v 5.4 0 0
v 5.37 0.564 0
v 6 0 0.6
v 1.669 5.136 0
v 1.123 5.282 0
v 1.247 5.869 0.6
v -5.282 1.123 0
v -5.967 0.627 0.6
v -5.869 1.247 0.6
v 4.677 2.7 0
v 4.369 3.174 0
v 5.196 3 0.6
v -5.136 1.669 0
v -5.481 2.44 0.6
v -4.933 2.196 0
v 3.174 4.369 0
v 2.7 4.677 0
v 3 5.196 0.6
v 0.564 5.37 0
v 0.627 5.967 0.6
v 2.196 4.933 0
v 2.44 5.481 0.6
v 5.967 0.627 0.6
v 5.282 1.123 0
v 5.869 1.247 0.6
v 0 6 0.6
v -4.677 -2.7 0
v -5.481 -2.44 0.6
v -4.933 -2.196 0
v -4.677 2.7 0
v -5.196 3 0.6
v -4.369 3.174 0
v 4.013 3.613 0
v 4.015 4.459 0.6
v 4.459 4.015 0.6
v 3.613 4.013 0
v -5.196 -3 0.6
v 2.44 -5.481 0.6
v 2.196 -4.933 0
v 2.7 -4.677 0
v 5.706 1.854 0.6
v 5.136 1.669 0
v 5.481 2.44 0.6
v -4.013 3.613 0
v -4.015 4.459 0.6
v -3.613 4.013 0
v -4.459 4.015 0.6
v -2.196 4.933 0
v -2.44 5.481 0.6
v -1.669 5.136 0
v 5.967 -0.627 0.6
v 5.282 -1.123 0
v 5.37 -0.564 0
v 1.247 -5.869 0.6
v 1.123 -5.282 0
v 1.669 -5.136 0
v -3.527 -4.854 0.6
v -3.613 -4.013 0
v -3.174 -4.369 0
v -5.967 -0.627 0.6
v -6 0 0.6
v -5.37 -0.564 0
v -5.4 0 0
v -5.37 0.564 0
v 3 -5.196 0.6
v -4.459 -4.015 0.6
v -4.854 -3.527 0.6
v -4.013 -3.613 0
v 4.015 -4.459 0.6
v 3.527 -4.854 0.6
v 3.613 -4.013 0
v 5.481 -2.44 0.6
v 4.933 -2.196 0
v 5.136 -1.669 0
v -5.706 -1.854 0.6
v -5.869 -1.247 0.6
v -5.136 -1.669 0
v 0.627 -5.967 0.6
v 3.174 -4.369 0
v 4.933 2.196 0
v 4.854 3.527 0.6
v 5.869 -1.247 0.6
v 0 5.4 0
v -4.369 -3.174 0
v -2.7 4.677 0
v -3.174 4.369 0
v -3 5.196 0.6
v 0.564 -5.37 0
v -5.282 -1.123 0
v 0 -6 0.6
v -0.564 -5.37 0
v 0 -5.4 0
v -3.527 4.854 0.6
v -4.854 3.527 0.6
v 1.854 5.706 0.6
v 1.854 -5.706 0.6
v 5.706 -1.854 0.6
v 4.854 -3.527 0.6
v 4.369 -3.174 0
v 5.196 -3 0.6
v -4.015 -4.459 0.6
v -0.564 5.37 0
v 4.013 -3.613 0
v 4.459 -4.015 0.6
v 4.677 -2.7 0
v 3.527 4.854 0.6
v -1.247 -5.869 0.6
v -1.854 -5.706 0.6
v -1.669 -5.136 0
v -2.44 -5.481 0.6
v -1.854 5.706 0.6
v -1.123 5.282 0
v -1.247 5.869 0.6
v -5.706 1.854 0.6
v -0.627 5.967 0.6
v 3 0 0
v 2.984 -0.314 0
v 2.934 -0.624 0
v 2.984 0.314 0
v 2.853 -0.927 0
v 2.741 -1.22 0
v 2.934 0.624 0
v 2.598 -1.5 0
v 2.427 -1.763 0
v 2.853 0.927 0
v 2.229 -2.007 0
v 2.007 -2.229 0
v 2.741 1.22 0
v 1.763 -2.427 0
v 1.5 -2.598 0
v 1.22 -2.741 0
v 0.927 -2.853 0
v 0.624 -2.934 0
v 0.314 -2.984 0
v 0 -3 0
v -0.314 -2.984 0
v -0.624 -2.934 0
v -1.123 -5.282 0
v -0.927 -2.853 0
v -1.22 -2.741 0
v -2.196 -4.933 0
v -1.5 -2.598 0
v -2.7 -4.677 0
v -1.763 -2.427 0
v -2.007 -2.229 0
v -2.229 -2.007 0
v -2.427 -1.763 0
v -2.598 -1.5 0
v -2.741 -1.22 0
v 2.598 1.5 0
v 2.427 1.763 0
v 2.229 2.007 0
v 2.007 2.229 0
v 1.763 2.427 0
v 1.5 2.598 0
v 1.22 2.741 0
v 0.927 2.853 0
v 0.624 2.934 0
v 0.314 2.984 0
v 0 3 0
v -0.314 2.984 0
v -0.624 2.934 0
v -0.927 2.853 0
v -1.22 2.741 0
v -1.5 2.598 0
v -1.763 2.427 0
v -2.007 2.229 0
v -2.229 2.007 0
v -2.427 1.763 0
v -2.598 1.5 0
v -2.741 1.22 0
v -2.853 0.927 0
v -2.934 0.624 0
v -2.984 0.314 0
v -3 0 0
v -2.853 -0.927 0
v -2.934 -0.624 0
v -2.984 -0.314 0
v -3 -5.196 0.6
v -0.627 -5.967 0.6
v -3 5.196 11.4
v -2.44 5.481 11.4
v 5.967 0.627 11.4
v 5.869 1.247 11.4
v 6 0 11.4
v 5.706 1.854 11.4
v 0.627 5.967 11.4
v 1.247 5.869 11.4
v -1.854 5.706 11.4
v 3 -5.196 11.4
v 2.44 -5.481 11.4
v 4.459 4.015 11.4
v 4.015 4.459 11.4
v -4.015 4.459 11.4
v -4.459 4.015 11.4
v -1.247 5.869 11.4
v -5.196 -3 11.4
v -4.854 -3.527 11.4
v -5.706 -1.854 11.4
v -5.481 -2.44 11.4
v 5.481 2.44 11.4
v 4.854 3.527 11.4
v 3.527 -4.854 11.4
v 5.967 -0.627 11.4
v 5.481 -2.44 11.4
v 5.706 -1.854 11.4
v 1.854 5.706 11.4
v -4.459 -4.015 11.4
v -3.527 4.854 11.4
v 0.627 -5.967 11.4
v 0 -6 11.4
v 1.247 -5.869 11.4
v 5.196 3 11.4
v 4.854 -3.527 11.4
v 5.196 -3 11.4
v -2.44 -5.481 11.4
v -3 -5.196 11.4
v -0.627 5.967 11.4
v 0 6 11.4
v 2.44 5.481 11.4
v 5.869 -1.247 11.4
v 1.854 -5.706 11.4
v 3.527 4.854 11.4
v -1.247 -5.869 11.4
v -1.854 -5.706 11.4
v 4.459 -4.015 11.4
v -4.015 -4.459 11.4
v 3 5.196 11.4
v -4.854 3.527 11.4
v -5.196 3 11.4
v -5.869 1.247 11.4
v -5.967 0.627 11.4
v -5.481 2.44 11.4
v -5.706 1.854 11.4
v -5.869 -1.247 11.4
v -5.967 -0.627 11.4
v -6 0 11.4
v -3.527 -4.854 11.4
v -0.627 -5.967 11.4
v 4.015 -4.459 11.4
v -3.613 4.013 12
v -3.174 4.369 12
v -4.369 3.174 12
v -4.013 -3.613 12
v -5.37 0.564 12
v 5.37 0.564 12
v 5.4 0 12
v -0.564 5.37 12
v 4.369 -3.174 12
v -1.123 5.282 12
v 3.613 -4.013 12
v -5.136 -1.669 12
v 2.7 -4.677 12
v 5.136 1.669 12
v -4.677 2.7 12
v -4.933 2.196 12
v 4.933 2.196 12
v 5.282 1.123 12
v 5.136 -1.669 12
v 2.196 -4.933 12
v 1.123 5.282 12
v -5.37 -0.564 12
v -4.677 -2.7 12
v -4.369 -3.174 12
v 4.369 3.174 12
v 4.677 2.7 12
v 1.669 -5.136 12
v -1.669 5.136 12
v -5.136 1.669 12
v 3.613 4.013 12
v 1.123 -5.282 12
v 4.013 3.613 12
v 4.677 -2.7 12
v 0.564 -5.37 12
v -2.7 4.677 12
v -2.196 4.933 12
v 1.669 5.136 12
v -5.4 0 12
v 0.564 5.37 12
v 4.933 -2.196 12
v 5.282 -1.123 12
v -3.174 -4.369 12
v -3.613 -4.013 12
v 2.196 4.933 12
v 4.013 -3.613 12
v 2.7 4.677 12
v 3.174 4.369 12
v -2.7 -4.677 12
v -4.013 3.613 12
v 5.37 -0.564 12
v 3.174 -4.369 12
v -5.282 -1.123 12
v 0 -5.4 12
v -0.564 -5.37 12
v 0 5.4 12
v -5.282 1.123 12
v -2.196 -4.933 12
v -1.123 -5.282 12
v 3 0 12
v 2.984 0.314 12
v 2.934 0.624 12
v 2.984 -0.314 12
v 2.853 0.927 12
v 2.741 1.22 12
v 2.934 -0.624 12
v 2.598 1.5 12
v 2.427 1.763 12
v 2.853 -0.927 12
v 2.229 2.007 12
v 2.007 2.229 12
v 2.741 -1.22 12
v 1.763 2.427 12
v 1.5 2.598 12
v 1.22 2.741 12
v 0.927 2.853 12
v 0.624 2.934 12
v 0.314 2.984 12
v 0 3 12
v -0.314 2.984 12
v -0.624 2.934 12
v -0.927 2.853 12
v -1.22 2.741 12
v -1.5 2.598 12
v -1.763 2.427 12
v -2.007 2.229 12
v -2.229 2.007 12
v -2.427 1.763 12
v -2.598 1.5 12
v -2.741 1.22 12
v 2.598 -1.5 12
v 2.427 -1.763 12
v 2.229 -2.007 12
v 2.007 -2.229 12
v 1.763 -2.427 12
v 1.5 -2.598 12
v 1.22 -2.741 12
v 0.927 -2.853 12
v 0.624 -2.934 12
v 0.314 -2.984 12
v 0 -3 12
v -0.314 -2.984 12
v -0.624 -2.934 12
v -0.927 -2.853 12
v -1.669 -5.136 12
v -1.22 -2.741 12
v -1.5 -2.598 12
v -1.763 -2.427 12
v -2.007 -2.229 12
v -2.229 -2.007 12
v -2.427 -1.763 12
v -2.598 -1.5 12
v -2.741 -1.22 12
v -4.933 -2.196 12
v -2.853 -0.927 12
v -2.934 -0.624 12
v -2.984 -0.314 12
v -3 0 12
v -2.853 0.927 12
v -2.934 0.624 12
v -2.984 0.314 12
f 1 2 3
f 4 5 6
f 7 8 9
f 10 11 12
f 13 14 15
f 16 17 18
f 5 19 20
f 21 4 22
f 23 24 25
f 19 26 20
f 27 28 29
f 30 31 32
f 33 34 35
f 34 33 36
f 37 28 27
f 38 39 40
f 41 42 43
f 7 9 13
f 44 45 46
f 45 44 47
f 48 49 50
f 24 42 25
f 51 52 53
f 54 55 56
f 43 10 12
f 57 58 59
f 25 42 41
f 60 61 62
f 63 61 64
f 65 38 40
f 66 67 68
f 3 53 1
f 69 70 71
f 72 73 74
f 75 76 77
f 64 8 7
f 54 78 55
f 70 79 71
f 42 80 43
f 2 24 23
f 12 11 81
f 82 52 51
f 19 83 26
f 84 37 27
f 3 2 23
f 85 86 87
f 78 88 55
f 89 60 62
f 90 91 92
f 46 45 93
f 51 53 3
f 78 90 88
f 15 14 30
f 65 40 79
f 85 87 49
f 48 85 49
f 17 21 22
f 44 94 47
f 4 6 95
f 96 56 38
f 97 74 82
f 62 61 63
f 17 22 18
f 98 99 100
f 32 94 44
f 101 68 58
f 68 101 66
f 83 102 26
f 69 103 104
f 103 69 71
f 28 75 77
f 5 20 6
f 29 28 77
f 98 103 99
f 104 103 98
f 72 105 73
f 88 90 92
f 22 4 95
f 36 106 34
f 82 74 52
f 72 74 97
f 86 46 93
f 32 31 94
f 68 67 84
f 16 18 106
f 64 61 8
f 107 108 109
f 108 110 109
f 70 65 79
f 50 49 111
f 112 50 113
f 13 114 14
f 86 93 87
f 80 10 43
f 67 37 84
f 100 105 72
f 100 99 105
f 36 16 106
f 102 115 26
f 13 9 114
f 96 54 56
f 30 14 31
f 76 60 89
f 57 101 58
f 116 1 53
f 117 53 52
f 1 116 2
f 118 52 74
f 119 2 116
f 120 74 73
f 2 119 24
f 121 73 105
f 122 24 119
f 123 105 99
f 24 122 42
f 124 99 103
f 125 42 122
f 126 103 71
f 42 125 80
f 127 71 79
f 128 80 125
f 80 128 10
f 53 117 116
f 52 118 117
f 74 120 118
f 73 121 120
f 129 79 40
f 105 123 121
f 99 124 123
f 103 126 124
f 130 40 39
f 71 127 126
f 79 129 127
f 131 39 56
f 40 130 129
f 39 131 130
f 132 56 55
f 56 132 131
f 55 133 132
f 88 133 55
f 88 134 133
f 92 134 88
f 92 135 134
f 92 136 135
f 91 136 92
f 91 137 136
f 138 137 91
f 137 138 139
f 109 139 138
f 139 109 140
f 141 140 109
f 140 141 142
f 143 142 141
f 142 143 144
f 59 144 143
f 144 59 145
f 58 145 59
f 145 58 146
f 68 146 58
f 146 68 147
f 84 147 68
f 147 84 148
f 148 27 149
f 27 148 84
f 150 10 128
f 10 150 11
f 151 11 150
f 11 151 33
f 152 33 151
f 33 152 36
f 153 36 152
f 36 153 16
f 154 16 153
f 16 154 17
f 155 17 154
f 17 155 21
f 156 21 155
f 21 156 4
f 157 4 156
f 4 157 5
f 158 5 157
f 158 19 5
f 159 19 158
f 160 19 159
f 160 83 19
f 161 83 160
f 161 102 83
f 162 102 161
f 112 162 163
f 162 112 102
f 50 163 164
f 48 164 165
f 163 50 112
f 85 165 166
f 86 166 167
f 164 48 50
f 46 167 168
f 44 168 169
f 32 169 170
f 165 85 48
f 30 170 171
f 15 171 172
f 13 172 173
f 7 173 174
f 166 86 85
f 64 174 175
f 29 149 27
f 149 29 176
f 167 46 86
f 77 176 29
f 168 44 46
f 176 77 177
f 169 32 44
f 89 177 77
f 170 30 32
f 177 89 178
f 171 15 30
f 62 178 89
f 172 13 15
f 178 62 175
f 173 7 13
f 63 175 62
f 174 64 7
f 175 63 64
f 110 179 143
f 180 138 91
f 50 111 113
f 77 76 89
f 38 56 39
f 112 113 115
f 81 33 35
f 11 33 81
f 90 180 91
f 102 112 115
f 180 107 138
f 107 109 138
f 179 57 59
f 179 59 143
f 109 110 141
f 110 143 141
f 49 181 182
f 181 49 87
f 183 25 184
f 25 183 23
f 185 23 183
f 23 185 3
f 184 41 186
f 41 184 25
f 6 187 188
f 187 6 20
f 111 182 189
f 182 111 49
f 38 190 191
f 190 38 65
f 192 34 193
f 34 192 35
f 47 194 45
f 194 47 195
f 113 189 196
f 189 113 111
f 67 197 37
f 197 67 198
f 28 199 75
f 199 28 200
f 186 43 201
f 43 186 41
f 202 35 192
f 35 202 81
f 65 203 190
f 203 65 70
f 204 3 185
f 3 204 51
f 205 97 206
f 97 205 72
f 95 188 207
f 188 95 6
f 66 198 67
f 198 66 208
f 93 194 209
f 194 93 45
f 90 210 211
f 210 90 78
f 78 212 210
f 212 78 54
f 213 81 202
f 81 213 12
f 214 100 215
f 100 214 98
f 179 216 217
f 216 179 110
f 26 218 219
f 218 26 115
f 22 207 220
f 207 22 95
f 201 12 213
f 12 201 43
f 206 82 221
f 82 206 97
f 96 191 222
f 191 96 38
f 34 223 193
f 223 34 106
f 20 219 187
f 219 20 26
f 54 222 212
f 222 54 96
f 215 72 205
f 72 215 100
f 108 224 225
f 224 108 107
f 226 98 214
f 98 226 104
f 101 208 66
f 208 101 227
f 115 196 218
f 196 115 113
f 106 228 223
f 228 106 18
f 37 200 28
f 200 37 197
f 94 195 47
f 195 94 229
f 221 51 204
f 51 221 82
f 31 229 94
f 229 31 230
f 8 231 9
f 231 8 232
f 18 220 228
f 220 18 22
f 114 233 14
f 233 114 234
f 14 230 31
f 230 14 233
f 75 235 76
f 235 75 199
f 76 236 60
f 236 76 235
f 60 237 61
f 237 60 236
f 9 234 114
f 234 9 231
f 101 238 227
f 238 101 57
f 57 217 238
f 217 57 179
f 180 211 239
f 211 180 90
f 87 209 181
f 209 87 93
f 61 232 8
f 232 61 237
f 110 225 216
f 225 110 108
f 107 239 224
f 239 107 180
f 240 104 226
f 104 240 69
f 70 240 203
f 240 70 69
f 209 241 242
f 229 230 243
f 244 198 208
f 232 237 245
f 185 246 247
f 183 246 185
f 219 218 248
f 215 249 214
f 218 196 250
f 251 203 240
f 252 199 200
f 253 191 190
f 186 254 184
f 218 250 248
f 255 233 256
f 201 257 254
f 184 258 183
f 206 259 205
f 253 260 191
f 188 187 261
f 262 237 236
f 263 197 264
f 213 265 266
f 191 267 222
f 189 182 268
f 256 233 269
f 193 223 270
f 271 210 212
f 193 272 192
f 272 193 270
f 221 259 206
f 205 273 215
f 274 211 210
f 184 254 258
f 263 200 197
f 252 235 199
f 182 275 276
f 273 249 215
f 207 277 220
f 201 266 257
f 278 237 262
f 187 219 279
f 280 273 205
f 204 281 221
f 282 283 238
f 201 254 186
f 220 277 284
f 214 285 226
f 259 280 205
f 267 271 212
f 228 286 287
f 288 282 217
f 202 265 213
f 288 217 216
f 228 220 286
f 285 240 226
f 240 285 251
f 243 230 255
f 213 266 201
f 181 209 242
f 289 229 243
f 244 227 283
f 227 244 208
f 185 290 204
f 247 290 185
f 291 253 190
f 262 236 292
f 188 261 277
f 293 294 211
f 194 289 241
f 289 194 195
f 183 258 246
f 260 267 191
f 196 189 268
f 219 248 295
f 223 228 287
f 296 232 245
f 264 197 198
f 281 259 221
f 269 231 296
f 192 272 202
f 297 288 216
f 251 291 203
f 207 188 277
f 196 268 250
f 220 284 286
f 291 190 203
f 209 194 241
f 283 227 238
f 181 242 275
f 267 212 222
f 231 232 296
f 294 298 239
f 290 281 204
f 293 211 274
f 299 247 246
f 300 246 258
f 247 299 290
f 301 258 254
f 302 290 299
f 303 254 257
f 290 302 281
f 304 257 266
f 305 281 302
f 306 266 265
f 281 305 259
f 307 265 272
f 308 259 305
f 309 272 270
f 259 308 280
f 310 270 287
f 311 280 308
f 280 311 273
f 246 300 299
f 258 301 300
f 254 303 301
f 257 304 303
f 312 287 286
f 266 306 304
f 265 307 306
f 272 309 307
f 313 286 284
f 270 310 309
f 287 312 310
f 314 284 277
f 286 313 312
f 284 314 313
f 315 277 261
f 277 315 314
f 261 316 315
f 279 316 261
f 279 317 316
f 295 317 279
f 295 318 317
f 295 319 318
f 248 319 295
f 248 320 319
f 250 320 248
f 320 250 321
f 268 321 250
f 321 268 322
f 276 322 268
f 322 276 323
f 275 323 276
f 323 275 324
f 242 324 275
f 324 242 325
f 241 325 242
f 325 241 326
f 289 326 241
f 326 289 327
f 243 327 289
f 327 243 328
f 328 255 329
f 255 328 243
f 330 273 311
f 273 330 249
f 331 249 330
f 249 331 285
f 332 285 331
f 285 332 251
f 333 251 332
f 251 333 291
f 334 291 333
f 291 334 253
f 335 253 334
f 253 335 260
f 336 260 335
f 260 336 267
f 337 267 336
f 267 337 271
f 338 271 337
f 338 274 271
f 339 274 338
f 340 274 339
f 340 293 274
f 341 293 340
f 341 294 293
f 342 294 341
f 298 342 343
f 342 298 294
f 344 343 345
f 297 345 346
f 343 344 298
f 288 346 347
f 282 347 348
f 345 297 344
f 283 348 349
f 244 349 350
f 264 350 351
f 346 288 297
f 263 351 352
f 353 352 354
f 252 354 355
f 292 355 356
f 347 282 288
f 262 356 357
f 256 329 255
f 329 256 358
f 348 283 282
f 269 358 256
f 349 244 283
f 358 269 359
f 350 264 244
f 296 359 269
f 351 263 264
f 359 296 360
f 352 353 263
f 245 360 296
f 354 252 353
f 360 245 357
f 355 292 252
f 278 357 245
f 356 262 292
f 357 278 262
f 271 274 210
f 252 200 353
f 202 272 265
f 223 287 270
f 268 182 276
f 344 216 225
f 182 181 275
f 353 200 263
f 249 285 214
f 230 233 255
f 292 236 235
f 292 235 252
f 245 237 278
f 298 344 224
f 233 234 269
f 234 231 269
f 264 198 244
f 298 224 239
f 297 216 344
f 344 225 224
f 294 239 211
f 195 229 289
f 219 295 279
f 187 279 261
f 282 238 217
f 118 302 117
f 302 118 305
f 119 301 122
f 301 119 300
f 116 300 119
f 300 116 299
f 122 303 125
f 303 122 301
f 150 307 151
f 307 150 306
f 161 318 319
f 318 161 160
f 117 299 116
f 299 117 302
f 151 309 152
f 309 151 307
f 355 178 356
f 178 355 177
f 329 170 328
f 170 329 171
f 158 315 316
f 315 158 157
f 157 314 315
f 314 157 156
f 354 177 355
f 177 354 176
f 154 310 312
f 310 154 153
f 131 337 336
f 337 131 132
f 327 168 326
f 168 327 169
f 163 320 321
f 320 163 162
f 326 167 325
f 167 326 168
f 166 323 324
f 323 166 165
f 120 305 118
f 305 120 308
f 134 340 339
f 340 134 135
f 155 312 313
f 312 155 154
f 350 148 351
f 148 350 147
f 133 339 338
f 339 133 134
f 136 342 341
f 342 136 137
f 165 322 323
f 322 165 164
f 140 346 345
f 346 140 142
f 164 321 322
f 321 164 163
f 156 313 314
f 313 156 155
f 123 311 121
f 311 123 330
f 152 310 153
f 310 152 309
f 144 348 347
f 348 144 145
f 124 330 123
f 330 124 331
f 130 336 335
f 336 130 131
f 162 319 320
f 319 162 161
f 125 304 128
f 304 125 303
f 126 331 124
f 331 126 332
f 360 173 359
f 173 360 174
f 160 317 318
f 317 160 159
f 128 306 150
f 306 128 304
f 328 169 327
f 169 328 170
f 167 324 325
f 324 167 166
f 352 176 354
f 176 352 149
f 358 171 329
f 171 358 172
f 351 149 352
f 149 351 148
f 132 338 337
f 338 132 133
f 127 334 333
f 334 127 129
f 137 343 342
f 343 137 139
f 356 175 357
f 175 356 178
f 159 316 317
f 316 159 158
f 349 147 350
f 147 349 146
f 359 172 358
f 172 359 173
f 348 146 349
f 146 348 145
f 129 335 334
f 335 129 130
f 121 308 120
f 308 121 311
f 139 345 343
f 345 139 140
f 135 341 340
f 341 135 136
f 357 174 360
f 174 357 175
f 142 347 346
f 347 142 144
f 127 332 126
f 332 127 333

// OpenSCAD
// Plain sleeve bushing.
$fn = 60;
eps = 0.02;
inner_d = 6;
outer_d = 12;
length = 12;
chamfer = 0.6;
difference() {
    union() {
        cylinder(d1 = outer_d - 2 * chamfer, d2 = outer_d, h = chamfer);
        translate([0, 0, chamfer]) cylinder(d = outer_d, h = length - 2 * chamfer);
        translate([0, 0, length - chamfer]) cylinder(d1 = outer_d, d2 = outer_d - 2 * chamfer, h = chamfer);
    }
    translate([0, 0, -eps]) cylinder(d = inner_d, h = length + 2 * eps);
}
